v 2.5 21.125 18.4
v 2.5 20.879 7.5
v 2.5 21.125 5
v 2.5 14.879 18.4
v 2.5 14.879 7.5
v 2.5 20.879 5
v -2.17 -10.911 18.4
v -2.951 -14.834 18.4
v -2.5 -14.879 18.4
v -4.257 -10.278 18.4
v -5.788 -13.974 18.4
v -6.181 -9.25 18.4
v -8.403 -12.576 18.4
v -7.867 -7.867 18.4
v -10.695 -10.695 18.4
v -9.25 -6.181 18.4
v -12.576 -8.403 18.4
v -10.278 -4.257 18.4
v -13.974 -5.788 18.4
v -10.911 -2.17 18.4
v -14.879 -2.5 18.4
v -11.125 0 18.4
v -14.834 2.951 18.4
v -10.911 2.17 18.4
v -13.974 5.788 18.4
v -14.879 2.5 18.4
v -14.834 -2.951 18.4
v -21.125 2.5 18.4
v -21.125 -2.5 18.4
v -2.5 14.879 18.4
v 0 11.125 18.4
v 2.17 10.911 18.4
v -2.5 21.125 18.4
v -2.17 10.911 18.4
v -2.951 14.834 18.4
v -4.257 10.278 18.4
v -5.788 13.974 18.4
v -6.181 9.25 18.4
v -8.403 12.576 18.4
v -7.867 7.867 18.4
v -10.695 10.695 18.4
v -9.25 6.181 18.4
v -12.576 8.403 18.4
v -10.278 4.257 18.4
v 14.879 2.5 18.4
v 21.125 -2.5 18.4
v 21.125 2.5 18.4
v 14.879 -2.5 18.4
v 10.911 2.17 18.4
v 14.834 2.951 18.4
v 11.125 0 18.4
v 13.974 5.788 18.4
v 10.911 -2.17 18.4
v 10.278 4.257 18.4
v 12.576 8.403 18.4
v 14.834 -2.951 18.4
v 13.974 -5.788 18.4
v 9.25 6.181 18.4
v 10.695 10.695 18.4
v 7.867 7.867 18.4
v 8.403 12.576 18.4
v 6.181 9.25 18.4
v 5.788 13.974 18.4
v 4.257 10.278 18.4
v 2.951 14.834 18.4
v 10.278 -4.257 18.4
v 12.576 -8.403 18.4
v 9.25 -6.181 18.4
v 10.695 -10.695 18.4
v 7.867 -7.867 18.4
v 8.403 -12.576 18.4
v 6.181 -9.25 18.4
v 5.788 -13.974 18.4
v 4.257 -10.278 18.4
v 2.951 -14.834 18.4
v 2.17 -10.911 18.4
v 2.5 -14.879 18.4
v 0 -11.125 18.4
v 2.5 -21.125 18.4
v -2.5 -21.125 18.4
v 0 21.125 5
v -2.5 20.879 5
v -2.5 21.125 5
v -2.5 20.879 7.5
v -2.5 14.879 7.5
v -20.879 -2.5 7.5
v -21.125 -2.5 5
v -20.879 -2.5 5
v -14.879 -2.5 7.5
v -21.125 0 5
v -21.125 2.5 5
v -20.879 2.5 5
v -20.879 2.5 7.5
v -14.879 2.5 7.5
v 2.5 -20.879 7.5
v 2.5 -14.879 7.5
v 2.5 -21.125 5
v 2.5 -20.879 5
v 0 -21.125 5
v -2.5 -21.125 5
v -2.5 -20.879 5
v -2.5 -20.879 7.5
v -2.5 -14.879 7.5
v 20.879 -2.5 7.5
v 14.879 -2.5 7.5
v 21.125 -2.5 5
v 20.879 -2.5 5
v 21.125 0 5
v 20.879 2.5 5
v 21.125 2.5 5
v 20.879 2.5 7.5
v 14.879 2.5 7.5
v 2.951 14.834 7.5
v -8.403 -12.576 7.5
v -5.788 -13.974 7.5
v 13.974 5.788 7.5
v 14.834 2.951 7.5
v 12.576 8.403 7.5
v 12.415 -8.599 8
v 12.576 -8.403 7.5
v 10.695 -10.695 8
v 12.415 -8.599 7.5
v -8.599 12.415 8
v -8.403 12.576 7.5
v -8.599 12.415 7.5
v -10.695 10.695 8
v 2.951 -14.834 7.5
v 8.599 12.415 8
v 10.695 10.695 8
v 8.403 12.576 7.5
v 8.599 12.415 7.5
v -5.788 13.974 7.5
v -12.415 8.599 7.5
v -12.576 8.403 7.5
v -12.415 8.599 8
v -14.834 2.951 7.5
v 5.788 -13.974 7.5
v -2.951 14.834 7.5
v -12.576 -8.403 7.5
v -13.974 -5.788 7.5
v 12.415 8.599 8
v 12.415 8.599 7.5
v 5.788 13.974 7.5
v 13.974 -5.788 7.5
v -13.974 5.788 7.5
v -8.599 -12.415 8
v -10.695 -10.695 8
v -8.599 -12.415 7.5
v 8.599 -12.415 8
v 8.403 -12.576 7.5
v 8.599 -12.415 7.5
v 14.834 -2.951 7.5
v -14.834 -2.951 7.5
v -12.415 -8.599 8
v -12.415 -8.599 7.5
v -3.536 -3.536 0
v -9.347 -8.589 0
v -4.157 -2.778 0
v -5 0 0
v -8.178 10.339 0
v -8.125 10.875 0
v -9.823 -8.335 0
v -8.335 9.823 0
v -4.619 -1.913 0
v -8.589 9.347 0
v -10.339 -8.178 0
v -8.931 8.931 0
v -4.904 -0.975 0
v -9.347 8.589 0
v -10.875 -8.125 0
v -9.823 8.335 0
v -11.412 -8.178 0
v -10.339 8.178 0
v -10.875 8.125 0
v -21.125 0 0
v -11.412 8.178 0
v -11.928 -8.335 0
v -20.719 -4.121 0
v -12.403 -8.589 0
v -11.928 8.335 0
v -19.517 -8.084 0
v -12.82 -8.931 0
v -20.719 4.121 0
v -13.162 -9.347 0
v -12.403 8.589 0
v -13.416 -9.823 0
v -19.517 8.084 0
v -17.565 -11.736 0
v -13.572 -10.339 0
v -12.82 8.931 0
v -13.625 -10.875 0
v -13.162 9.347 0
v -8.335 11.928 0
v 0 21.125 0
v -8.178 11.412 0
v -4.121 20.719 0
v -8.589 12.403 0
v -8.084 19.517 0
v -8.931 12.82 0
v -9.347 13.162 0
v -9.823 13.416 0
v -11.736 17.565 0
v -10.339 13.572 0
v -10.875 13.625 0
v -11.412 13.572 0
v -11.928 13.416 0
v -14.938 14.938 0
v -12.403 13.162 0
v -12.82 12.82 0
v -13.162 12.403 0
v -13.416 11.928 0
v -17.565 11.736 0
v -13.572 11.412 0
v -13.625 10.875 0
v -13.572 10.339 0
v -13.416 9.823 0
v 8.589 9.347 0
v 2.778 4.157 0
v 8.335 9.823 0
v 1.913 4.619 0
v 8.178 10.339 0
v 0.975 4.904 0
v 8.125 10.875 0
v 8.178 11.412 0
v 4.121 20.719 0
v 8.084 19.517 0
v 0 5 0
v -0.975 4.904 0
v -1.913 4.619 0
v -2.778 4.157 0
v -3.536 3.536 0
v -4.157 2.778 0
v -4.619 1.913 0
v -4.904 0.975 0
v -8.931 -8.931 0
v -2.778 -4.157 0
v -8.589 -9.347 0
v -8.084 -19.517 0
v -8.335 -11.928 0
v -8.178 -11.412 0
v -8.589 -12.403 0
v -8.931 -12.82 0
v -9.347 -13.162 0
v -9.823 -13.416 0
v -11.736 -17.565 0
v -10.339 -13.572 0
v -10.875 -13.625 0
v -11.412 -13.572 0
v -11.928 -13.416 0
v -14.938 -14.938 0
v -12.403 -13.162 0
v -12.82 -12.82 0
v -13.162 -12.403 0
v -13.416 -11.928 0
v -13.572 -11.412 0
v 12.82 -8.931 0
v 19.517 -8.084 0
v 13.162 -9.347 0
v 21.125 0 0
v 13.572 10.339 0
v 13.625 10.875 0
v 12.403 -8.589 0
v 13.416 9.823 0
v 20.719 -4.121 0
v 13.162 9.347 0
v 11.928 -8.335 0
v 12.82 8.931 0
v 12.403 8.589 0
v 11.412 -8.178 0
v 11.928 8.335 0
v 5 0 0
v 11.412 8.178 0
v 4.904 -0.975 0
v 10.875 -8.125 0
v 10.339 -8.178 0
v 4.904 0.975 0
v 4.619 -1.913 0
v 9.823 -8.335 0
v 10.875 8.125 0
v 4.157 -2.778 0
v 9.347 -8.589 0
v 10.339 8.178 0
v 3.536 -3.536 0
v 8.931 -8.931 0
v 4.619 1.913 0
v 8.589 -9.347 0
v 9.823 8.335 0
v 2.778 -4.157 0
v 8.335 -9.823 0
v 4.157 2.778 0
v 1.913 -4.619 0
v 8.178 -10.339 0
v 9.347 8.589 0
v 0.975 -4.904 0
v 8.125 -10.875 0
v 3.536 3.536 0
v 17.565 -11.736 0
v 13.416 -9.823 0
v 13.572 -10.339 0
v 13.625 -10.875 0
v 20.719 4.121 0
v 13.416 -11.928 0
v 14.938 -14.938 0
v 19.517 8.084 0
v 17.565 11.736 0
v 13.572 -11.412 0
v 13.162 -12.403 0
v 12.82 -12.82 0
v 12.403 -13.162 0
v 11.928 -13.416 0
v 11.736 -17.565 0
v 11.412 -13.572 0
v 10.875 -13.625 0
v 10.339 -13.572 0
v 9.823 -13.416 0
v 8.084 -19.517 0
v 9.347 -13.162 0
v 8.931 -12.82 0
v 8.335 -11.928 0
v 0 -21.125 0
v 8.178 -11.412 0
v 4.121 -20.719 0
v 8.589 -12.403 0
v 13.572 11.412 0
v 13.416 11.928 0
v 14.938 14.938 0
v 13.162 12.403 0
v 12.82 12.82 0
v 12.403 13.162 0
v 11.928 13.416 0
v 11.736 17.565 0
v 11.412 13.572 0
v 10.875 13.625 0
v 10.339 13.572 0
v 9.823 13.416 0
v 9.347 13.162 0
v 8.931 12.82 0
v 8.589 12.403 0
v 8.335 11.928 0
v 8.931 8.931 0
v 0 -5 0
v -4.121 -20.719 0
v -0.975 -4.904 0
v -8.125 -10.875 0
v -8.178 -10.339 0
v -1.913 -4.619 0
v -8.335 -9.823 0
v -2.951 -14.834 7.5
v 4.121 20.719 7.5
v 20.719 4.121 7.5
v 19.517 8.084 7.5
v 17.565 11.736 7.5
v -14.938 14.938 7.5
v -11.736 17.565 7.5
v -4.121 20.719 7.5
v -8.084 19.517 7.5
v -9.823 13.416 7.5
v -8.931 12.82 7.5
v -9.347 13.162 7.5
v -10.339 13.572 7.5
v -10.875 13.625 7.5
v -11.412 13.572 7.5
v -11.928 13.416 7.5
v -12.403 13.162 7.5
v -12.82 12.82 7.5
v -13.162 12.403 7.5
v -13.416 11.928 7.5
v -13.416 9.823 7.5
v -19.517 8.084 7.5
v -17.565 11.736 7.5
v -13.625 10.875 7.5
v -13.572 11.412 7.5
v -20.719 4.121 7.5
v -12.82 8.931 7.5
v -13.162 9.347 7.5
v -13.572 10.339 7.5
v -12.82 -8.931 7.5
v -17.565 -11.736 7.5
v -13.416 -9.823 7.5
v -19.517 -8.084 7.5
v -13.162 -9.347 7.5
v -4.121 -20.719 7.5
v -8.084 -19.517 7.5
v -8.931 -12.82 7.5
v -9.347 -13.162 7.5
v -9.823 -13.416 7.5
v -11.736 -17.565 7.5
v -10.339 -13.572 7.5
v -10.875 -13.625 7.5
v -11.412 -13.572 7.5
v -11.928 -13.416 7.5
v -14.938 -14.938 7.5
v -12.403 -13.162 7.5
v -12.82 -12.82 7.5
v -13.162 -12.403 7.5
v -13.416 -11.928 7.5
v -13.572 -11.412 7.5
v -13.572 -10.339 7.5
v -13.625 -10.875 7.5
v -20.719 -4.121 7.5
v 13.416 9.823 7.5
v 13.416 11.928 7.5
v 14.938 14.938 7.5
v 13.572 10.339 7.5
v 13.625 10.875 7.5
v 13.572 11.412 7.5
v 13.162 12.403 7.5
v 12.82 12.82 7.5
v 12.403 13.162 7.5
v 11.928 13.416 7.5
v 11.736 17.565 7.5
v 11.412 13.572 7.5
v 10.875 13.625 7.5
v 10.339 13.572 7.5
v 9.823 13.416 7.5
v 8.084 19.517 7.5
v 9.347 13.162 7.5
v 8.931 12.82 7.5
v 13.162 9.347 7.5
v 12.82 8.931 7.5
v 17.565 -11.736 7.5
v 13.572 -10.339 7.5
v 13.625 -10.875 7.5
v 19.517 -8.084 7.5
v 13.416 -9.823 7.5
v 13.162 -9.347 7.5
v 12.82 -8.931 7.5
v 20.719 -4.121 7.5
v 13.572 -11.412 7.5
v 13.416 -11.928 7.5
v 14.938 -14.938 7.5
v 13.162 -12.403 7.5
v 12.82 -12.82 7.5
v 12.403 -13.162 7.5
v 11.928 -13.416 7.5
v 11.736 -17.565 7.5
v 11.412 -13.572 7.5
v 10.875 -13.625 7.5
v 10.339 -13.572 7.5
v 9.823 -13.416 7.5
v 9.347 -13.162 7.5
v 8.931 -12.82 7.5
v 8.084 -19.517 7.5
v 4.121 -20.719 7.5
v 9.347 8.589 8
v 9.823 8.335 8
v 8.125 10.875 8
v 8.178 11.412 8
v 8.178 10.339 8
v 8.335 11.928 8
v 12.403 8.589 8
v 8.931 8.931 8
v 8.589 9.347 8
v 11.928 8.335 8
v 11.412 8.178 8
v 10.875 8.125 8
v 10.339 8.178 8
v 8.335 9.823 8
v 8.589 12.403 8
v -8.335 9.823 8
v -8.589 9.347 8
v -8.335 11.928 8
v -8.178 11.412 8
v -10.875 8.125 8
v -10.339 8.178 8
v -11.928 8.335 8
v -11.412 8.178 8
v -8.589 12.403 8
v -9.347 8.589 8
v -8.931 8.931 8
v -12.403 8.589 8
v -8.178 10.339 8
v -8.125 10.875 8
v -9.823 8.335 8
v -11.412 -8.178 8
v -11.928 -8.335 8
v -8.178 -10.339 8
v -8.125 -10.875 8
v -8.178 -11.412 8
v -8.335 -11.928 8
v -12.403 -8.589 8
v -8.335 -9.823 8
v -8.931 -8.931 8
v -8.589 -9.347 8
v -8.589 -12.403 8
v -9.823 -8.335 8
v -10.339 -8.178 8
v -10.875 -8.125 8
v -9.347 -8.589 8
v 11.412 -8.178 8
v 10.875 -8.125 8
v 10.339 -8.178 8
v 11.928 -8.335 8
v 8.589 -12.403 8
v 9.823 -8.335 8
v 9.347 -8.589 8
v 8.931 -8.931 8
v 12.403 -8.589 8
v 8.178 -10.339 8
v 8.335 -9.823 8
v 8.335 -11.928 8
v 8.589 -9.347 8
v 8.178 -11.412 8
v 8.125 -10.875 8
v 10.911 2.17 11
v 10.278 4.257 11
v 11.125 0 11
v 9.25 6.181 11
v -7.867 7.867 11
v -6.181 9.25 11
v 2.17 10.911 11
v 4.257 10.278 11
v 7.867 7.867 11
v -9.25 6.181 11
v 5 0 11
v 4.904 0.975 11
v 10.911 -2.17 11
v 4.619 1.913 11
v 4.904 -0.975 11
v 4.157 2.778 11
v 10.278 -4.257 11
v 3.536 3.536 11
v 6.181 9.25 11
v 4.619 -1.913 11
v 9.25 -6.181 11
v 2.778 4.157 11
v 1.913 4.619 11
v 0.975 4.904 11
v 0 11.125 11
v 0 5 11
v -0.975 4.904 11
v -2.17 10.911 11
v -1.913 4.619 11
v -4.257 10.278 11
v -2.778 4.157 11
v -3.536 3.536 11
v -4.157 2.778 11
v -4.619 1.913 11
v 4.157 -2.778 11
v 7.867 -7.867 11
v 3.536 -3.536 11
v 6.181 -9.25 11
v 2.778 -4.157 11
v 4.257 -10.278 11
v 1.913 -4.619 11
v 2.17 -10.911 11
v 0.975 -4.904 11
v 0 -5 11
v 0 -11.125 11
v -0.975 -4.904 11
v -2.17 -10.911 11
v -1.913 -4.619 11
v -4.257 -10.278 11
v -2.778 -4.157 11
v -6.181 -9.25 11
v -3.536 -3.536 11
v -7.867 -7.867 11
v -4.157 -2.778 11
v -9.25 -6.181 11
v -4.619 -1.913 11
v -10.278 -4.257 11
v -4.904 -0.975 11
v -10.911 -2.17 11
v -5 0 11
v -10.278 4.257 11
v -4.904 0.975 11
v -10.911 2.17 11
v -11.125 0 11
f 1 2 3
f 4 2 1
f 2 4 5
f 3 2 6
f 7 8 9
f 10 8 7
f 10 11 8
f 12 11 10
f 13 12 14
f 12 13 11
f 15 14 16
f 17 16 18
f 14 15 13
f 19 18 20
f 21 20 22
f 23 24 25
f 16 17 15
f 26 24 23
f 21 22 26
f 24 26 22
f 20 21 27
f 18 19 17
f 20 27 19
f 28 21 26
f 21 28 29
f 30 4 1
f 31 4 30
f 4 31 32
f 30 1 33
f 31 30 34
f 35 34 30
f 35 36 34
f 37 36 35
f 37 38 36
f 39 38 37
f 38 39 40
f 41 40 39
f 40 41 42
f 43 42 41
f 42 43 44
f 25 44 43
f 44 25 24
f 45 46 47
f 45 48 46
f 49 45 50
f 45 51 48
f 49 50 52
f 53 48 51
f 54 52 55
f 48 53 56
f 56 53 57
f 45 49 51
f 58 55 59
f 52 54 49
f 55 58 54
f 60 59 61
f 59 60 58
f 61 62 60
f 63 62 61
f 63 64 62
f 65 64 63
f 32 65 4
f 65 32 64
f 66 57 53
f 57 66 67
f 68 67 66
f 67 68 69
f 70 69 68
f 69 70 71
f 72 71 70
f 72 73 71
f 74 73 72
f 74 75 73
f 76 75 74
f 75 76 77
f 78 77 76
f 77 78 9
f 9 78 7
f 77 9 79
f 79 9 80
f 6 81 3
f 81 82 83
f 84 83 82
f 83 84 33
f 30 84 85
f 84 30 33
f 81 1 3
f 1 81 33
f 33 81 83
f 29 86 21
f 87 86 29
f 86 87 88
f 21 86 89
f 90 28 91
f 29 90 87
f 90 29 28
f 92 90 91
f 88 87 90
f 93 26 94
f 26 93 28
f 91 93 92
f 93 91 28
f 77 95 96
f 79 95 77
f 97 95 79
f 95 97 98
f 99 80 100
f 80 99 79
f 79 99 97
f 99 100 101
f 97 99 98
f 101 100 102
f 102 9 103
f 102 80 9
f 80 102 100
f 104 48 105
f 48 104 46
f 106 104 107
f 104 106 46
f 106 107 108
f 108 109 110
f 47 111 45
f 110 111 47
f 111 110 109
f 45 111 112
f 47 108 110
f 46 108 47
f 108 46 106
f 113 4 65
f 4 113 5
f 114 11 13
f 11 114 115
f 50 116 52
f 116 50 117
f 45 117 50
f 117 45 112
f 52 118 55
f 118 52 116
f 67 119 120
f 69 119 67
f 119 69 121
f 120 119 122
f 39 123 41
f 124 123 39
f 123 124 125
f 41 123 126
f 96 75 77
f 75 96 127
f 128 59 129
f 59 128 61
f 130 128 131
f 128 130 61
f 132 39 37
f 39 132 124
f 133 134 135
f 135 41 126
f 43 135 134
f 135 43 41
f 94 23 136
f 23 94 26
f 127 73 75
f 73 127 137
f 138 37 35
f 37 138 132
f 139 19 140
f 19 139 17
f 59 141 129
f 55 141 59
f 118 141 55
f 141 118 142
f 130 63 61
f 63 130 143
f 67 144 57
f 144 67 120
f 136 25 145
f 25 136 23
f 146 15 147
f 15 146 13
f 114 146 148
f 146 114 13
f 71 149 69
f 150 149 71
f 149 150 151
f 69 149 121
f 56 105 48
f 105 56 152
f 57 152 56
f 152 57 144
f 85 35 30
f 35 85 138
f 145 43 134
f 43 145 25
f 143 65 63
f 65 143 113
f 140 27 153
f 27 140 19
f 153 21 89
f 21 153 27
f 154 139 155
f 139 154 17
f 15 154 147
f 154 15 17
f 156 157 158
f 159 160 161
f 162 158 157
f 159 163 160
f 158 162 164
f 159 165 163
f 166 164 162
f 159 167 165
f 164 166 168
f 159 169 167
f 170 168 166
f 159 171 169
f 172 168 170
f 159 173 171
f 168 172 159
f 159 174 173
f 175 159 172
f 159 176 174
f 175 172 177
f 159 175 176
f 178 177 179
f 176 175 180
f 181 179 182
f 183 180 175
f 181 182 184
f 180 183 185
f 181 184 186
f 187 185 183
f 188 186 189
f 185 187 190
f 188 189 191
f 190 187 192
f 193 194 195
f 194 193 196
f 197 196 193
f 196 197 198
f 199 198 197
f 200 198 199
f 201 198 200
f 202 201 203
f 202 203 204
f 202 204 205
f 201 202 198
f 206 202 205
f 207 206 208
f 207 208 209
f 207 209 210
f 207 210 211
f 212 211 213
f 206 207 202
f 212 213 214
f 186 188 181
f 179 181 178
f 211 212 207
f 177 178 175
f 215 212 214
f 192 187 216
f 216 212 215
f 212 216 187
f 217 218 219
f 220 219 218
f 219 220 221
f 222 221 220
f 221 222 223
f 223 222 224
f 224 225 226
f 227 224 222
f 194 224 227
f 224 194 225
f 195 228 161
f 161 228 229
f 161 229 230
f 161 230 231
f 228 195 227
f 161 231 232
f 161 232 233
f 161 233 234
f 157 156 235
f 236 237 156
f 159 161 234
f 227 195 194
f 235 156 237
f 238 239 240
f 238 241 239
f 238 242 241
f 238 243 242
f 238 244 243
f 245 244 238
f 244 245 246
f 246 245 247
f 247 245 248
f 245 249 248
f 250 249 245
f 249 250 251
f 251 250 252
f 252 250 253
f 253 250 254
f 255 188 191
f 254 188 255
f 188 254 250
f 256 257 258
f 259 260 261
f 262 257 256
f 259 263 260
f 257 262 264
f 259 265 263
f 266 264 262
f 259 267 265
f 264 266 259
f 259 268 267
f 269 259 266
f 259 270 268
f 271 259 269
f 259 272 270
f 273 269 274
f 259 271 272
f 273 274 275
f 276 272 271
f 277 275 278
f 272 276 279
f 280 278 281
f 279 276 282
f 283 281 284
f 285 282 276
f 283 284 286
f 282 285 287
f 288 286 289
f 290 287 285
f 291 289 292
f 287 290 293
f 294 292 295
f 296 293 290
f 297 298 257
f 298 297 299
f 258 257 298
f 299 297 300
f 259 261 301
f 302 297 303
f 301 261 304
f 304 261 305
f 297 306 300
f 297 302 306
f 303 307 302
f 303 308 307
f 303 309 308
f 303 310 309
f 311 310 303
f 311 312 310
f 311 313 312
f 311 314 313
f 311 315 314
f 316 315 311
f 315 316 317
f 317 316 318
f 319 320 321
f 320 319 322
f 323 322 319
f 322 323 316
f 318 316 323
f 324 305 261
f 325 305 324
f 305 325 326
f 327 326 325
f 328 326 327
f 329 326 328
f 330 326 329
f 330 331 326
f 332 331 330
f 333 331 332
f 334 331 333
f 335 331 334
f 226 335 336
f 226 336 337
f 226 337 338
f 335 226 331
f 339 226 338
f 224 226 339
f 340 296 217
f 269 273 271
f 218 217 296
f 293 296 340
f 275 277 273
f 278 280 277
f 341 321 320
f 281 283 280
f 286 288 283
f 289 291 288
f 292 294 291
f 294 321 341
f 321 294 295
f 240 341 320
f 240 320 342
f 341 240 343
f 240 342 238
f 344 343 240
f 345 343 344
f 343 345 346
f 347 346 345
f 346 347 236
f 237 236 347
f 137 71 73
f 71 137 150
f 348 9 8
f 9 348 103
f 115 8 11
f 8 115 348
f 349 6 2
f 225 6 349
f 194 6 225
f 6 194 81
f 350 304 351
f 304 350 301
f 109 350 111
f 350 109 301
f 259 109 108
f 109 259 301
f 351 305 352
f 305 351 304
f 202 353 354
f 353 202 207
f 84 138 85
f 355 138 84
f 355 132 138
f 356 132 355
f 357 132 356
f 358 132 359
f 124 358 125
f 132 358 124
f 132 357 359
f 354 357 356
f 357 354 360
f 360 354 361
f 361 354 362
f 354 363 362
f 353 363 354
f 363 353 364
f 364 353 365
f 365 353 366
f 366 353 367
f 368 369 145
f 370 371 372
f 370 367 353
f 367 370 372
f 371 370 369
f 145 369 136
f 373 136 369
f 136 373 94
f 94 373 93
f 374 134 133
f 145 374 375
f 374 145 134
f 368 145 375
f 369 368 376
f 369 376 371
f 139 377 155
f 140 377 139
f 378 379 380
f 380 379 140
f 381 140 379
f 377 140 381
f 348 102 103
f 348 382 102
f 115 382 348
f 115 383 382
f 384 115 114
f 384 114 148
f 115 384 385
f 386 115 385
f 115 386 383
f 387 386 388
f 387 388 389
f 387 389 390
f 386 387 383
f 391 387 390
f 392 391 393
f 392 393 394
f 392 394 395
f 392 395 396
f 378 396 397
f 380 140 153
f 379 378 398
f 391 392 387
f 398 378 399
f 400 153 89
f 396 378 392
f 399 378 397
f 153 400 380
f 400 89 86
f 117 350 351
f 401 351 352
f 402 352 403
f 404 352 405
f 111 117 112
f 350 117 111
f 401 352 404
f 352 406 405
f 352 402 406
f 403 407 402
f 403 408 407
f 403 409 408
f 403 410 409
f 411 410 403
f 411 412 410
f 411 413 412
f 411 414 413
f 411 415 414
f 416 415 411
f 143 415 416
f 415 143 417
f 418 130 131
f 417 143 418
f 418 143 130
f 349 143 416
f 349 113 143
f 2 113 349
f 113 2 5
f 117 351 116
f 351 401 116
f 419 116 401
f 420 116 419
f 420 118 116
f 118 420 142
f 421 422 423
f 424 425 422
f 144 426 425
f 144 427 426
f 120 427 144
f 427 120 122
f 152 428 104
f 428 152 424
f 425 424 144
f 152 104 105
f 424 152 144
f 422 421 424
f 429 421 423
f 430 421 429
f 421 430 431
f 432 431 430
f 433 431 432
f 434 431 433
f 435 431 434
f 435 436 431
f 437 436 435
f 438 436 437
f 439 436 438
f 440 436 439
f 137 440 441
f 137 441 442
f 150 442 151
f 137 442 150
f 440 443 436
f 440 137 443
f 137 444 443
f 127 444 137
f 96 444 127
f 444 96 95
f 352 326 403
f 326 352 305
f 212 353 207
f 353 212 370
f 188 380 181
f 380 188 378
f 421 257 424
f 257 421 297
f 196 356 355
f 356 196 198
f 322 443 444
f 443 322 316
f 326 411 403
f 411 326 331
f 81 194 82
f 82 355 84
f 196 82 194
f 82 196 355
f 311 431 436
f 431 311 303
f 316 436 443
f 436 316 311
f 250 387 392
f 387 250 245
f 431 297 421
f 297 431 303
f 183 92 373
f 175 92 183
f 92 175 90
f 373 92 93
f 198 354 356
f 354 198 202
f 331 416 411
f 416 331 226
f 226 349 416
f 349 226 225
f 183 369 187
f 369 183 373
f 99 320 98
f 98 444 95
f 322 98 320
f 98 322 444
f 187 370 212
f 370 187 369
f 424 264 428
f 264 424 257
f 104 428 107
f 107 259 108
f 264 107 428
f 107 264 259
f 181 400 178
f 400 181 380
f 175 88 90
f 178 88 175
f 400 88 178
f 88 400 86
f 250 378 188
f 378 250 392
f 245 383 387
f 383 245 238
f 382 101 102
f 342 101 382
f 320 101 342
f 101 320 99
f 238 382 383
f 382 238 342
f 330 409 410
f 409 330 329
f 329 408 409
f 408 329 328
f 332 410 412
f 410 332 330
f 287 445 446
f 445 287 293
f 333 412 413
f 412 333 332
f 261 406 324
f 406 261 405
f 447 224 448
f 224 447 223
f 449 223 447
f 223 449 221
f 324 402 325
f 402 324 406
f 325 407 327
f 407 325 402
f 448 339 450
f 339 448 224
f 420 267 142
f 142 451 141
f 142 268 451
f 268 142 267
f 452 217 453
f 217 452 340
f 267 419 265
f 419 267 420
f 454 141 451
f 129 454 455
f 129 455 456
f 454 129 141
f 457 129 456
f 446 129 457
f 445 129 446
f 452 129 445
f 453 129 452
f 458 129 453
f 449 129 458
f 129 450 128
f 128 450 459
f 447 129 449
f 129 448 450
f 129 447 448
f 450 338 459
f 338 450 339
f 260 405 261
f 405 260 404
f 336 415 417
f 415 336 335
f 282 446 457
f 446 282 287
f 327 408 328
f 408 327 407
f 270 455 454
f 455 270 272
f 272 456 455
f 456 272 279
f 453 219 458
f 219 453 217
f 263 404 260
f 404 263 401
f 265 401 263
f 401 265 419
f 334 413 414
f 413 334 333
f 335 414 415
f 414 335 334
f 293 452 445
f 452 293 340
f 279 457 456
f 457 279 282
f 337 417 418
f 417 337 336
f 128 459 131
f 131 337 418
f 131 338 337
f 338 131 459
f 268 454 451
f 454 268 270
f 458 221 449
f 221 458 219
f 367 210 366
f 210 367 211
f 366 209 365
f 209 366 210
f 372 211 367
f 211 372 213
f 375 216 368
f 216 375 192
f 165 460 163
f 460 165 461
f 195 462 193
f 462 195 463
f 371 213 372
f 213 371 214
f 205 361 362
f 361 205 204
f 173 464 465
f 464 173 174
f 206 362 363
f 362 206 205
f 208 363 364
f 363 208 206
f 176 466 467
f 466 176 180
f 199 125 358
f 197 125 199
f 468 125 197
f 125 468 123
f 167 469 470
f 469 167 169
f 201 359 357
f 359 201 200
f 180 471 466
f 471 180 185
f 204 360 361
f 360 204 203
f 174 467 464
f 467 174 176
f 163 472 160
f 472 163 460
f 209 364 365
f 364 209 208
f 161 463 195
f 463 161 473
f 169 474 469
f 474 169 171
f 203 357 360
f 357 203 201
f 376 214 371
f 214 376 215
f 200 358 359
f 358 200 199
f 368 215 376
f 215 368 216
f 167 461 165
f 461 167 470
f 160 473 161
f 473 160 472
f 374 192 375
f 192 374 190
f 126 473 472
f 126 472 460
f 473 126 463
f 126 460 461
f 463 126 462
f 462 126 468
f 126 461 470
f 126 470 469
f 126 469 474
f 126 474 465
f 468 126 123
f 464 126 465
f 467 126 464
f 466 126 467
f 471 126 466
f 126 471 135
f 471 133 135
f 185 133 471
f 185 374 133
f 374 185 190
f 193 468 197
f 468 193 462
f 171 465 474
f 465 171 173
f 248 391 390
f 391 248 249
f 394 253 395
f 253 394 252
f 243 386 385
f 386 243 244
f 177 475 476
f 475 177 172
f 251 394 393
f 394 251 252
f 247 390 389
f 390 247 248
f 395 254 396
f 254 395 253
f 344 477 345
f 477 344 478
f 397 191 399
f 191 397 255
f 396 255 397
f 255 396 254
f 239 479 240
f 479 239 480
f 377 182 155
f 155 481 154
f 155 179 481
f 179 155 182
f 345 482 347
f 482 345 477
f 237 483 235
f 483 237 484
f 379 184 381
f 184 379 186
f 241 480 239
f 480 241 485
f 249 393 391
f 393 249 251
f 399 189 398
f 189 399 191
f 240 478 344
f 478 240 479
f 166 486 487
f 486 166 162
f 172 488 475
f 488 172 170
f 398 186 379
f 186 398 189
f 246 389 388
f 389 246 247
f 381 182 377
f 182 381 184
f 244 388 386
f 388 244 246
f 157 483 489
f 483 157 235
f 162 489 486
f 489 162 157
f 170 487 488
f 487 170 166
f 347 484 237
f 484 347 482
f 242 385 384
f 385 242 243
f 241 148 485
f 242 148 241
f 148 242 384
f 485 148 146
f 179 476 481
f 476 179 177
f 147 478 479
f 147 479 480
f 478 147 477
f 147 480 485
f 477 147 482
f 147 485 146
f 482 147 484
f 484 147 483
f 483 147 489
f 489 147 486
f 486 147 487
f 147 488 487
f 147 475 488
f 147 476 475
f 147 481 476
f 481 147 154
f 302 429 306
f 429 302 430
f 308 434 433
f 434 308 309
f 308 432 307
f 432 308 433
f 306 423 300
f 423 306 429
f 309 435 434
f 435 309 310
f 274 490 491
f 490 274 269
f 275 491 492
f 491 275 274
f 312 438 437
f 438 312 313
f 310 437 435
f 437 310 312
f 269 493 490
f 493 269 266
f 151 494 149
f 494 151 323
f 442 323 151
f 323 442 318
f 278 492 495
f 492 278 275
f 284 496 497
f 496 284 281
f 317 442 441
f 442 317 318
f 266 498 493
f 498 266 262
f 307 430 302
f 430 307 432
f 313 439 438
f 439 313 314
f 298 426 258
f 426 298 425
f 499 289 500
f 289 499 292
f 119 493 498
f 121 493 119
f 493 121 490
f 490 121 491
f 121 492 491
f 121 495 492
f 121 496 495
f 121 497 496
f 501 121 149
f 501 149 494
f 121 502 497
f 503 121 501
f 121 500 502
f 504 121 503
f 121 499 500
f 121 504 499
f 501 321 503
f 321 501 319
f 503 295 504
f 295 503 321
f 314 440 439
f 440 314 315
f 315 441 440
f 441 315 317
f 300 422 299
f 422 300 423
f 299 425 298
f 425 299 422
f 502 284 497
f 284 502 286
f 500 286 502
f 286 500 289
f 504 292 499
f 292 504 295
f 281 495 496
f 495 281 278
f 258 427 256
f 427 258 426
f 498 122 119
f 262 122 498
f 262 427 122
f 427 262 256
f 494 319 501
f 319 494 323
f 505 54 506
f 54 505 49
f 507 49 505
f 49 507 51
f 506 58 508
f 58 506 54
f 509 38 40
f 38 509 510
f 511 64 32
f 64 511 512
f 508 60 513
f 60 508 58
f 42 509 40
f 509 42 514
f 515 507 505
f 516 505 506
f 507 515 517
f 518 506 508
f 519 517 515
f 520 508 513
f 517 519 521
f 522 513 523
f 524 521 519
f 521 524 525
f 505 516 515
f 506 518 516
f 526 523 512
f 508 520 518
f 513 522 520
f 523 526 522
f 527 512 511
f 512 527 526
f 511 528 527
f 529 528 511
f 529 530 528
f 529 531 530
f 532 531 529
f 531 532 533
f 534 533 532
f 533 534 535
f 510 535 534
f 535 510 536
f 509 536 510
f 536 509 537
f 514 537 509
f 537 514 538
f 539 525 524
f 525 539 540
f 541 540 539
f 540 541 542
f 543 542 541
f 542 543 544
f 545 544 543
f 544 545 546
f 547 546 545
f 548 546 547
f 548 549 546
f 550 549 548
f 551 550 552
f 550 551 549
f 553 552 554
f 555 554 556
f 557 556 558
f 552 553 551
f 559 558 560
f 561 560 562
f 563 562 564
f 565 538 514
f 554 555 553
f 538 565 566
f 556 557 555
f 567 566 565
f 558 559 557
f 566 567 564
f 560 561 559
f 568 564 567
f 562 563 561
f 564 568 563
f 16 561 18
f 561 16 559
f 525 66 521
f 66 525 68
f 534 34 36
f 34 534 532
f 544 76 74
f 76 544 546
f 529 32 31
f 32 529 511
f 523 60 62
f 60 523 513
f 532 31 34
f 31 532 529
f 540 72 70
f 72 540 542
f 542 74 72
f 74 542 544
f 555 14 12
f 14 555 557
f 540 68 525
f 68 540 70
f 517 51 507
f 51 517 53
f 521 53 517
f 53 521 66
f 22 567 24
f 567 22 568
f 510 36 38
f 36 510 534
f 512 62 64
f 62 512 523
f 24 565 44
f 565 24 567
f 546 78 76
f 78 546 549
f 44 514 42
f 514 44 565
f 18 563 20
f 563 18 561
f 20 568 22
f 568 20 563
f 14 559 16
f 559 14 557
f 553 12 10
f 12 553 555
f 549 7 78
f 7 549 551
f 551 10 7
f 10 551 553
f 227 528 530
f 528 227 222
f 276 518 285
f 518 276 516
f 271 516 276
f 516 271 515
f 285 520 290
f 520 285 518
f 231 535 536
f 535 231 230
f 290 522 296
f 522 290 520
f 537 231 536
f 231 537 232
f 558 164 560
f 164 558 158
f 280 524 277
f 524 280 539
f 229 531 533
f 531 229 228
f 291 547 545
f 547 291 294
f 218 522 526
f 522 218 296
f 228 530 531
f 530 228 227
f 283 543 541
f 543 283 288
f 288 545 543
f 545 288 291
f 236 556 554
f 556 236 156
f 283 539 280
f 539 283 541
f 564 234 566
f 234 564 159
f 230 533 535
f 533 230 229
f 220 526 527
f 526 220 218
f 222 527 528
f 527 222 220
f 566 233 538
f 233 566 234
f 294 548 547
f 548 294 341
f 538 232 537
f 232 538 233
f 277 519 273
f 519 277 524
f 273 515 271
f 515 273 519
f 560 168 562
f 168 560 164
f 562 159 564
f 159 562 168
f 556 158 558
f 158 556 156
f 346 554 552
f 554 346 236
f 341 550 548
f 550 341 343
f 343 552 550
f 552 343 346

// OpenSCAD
$fn = 32;

// ----------------------------------------------------------------------
// Bearing housing: seat for 608 (22 x 7 mm), 30.25 mm body
// ----------------------------------------------------------------------

// --- parameters (mm) ---
body_od = 30.25;          // housing outside diameter
body_h = 18.4;            // overall housing height
wall = 4;                 // wall thickness
pocket_d = 22.25;         // 608 seat, 0.25 mm clearance
seat_h = 7.4;             // pocket depth
shoulder = 5;             // shoulder under the bearing
pass_d = 10;              // shaft passage
flange_dia = 42.25;       // mounting flange diameter
flange_t = 6;             // flange thickness
bolt_d = 5.5;             // flange bolt clearance
bolt_r = 15.38;           // flange bolt circle radius
rib_w = 5;                // rib width
rib_n = 4;                // rib count

module body() {
  cylinder(h = body_h, d = body_od);
}

module flange() {
  /* flange sunk 1.5 mm into the body */
  cylinder(h = flange_t + 1.5, d = flange_dia);
}

module ribs() {
  for (i = [0 : rib_n - 1])
    rotate([0, 0, i * 360 / rib_n])
      translate([-rib_w / 2, body_od / 2 - 0.8, flange_t - 1])
        cube([rib_w, (flange_dia - body_od) / 2 + 0.8, body_h - flange_t + 1]);
}

difference() {
  union() {
    body();
    flange();
    ribs();
  }
  translate([0, 0, body_h - seat_h]) cylinder(h = seat_h + 1, d = pocket_d);
  translate([0, 0, -1]) cylinder(h = body_h - seat_h + 1, d = pass_d);
  for (i = [0 : 3]) rotate([0, 0, 45 + i * 90]) translate([bolt_r, 0, -1])
    cylinder(h = flange_t + 3, d = bolt_d);
}
